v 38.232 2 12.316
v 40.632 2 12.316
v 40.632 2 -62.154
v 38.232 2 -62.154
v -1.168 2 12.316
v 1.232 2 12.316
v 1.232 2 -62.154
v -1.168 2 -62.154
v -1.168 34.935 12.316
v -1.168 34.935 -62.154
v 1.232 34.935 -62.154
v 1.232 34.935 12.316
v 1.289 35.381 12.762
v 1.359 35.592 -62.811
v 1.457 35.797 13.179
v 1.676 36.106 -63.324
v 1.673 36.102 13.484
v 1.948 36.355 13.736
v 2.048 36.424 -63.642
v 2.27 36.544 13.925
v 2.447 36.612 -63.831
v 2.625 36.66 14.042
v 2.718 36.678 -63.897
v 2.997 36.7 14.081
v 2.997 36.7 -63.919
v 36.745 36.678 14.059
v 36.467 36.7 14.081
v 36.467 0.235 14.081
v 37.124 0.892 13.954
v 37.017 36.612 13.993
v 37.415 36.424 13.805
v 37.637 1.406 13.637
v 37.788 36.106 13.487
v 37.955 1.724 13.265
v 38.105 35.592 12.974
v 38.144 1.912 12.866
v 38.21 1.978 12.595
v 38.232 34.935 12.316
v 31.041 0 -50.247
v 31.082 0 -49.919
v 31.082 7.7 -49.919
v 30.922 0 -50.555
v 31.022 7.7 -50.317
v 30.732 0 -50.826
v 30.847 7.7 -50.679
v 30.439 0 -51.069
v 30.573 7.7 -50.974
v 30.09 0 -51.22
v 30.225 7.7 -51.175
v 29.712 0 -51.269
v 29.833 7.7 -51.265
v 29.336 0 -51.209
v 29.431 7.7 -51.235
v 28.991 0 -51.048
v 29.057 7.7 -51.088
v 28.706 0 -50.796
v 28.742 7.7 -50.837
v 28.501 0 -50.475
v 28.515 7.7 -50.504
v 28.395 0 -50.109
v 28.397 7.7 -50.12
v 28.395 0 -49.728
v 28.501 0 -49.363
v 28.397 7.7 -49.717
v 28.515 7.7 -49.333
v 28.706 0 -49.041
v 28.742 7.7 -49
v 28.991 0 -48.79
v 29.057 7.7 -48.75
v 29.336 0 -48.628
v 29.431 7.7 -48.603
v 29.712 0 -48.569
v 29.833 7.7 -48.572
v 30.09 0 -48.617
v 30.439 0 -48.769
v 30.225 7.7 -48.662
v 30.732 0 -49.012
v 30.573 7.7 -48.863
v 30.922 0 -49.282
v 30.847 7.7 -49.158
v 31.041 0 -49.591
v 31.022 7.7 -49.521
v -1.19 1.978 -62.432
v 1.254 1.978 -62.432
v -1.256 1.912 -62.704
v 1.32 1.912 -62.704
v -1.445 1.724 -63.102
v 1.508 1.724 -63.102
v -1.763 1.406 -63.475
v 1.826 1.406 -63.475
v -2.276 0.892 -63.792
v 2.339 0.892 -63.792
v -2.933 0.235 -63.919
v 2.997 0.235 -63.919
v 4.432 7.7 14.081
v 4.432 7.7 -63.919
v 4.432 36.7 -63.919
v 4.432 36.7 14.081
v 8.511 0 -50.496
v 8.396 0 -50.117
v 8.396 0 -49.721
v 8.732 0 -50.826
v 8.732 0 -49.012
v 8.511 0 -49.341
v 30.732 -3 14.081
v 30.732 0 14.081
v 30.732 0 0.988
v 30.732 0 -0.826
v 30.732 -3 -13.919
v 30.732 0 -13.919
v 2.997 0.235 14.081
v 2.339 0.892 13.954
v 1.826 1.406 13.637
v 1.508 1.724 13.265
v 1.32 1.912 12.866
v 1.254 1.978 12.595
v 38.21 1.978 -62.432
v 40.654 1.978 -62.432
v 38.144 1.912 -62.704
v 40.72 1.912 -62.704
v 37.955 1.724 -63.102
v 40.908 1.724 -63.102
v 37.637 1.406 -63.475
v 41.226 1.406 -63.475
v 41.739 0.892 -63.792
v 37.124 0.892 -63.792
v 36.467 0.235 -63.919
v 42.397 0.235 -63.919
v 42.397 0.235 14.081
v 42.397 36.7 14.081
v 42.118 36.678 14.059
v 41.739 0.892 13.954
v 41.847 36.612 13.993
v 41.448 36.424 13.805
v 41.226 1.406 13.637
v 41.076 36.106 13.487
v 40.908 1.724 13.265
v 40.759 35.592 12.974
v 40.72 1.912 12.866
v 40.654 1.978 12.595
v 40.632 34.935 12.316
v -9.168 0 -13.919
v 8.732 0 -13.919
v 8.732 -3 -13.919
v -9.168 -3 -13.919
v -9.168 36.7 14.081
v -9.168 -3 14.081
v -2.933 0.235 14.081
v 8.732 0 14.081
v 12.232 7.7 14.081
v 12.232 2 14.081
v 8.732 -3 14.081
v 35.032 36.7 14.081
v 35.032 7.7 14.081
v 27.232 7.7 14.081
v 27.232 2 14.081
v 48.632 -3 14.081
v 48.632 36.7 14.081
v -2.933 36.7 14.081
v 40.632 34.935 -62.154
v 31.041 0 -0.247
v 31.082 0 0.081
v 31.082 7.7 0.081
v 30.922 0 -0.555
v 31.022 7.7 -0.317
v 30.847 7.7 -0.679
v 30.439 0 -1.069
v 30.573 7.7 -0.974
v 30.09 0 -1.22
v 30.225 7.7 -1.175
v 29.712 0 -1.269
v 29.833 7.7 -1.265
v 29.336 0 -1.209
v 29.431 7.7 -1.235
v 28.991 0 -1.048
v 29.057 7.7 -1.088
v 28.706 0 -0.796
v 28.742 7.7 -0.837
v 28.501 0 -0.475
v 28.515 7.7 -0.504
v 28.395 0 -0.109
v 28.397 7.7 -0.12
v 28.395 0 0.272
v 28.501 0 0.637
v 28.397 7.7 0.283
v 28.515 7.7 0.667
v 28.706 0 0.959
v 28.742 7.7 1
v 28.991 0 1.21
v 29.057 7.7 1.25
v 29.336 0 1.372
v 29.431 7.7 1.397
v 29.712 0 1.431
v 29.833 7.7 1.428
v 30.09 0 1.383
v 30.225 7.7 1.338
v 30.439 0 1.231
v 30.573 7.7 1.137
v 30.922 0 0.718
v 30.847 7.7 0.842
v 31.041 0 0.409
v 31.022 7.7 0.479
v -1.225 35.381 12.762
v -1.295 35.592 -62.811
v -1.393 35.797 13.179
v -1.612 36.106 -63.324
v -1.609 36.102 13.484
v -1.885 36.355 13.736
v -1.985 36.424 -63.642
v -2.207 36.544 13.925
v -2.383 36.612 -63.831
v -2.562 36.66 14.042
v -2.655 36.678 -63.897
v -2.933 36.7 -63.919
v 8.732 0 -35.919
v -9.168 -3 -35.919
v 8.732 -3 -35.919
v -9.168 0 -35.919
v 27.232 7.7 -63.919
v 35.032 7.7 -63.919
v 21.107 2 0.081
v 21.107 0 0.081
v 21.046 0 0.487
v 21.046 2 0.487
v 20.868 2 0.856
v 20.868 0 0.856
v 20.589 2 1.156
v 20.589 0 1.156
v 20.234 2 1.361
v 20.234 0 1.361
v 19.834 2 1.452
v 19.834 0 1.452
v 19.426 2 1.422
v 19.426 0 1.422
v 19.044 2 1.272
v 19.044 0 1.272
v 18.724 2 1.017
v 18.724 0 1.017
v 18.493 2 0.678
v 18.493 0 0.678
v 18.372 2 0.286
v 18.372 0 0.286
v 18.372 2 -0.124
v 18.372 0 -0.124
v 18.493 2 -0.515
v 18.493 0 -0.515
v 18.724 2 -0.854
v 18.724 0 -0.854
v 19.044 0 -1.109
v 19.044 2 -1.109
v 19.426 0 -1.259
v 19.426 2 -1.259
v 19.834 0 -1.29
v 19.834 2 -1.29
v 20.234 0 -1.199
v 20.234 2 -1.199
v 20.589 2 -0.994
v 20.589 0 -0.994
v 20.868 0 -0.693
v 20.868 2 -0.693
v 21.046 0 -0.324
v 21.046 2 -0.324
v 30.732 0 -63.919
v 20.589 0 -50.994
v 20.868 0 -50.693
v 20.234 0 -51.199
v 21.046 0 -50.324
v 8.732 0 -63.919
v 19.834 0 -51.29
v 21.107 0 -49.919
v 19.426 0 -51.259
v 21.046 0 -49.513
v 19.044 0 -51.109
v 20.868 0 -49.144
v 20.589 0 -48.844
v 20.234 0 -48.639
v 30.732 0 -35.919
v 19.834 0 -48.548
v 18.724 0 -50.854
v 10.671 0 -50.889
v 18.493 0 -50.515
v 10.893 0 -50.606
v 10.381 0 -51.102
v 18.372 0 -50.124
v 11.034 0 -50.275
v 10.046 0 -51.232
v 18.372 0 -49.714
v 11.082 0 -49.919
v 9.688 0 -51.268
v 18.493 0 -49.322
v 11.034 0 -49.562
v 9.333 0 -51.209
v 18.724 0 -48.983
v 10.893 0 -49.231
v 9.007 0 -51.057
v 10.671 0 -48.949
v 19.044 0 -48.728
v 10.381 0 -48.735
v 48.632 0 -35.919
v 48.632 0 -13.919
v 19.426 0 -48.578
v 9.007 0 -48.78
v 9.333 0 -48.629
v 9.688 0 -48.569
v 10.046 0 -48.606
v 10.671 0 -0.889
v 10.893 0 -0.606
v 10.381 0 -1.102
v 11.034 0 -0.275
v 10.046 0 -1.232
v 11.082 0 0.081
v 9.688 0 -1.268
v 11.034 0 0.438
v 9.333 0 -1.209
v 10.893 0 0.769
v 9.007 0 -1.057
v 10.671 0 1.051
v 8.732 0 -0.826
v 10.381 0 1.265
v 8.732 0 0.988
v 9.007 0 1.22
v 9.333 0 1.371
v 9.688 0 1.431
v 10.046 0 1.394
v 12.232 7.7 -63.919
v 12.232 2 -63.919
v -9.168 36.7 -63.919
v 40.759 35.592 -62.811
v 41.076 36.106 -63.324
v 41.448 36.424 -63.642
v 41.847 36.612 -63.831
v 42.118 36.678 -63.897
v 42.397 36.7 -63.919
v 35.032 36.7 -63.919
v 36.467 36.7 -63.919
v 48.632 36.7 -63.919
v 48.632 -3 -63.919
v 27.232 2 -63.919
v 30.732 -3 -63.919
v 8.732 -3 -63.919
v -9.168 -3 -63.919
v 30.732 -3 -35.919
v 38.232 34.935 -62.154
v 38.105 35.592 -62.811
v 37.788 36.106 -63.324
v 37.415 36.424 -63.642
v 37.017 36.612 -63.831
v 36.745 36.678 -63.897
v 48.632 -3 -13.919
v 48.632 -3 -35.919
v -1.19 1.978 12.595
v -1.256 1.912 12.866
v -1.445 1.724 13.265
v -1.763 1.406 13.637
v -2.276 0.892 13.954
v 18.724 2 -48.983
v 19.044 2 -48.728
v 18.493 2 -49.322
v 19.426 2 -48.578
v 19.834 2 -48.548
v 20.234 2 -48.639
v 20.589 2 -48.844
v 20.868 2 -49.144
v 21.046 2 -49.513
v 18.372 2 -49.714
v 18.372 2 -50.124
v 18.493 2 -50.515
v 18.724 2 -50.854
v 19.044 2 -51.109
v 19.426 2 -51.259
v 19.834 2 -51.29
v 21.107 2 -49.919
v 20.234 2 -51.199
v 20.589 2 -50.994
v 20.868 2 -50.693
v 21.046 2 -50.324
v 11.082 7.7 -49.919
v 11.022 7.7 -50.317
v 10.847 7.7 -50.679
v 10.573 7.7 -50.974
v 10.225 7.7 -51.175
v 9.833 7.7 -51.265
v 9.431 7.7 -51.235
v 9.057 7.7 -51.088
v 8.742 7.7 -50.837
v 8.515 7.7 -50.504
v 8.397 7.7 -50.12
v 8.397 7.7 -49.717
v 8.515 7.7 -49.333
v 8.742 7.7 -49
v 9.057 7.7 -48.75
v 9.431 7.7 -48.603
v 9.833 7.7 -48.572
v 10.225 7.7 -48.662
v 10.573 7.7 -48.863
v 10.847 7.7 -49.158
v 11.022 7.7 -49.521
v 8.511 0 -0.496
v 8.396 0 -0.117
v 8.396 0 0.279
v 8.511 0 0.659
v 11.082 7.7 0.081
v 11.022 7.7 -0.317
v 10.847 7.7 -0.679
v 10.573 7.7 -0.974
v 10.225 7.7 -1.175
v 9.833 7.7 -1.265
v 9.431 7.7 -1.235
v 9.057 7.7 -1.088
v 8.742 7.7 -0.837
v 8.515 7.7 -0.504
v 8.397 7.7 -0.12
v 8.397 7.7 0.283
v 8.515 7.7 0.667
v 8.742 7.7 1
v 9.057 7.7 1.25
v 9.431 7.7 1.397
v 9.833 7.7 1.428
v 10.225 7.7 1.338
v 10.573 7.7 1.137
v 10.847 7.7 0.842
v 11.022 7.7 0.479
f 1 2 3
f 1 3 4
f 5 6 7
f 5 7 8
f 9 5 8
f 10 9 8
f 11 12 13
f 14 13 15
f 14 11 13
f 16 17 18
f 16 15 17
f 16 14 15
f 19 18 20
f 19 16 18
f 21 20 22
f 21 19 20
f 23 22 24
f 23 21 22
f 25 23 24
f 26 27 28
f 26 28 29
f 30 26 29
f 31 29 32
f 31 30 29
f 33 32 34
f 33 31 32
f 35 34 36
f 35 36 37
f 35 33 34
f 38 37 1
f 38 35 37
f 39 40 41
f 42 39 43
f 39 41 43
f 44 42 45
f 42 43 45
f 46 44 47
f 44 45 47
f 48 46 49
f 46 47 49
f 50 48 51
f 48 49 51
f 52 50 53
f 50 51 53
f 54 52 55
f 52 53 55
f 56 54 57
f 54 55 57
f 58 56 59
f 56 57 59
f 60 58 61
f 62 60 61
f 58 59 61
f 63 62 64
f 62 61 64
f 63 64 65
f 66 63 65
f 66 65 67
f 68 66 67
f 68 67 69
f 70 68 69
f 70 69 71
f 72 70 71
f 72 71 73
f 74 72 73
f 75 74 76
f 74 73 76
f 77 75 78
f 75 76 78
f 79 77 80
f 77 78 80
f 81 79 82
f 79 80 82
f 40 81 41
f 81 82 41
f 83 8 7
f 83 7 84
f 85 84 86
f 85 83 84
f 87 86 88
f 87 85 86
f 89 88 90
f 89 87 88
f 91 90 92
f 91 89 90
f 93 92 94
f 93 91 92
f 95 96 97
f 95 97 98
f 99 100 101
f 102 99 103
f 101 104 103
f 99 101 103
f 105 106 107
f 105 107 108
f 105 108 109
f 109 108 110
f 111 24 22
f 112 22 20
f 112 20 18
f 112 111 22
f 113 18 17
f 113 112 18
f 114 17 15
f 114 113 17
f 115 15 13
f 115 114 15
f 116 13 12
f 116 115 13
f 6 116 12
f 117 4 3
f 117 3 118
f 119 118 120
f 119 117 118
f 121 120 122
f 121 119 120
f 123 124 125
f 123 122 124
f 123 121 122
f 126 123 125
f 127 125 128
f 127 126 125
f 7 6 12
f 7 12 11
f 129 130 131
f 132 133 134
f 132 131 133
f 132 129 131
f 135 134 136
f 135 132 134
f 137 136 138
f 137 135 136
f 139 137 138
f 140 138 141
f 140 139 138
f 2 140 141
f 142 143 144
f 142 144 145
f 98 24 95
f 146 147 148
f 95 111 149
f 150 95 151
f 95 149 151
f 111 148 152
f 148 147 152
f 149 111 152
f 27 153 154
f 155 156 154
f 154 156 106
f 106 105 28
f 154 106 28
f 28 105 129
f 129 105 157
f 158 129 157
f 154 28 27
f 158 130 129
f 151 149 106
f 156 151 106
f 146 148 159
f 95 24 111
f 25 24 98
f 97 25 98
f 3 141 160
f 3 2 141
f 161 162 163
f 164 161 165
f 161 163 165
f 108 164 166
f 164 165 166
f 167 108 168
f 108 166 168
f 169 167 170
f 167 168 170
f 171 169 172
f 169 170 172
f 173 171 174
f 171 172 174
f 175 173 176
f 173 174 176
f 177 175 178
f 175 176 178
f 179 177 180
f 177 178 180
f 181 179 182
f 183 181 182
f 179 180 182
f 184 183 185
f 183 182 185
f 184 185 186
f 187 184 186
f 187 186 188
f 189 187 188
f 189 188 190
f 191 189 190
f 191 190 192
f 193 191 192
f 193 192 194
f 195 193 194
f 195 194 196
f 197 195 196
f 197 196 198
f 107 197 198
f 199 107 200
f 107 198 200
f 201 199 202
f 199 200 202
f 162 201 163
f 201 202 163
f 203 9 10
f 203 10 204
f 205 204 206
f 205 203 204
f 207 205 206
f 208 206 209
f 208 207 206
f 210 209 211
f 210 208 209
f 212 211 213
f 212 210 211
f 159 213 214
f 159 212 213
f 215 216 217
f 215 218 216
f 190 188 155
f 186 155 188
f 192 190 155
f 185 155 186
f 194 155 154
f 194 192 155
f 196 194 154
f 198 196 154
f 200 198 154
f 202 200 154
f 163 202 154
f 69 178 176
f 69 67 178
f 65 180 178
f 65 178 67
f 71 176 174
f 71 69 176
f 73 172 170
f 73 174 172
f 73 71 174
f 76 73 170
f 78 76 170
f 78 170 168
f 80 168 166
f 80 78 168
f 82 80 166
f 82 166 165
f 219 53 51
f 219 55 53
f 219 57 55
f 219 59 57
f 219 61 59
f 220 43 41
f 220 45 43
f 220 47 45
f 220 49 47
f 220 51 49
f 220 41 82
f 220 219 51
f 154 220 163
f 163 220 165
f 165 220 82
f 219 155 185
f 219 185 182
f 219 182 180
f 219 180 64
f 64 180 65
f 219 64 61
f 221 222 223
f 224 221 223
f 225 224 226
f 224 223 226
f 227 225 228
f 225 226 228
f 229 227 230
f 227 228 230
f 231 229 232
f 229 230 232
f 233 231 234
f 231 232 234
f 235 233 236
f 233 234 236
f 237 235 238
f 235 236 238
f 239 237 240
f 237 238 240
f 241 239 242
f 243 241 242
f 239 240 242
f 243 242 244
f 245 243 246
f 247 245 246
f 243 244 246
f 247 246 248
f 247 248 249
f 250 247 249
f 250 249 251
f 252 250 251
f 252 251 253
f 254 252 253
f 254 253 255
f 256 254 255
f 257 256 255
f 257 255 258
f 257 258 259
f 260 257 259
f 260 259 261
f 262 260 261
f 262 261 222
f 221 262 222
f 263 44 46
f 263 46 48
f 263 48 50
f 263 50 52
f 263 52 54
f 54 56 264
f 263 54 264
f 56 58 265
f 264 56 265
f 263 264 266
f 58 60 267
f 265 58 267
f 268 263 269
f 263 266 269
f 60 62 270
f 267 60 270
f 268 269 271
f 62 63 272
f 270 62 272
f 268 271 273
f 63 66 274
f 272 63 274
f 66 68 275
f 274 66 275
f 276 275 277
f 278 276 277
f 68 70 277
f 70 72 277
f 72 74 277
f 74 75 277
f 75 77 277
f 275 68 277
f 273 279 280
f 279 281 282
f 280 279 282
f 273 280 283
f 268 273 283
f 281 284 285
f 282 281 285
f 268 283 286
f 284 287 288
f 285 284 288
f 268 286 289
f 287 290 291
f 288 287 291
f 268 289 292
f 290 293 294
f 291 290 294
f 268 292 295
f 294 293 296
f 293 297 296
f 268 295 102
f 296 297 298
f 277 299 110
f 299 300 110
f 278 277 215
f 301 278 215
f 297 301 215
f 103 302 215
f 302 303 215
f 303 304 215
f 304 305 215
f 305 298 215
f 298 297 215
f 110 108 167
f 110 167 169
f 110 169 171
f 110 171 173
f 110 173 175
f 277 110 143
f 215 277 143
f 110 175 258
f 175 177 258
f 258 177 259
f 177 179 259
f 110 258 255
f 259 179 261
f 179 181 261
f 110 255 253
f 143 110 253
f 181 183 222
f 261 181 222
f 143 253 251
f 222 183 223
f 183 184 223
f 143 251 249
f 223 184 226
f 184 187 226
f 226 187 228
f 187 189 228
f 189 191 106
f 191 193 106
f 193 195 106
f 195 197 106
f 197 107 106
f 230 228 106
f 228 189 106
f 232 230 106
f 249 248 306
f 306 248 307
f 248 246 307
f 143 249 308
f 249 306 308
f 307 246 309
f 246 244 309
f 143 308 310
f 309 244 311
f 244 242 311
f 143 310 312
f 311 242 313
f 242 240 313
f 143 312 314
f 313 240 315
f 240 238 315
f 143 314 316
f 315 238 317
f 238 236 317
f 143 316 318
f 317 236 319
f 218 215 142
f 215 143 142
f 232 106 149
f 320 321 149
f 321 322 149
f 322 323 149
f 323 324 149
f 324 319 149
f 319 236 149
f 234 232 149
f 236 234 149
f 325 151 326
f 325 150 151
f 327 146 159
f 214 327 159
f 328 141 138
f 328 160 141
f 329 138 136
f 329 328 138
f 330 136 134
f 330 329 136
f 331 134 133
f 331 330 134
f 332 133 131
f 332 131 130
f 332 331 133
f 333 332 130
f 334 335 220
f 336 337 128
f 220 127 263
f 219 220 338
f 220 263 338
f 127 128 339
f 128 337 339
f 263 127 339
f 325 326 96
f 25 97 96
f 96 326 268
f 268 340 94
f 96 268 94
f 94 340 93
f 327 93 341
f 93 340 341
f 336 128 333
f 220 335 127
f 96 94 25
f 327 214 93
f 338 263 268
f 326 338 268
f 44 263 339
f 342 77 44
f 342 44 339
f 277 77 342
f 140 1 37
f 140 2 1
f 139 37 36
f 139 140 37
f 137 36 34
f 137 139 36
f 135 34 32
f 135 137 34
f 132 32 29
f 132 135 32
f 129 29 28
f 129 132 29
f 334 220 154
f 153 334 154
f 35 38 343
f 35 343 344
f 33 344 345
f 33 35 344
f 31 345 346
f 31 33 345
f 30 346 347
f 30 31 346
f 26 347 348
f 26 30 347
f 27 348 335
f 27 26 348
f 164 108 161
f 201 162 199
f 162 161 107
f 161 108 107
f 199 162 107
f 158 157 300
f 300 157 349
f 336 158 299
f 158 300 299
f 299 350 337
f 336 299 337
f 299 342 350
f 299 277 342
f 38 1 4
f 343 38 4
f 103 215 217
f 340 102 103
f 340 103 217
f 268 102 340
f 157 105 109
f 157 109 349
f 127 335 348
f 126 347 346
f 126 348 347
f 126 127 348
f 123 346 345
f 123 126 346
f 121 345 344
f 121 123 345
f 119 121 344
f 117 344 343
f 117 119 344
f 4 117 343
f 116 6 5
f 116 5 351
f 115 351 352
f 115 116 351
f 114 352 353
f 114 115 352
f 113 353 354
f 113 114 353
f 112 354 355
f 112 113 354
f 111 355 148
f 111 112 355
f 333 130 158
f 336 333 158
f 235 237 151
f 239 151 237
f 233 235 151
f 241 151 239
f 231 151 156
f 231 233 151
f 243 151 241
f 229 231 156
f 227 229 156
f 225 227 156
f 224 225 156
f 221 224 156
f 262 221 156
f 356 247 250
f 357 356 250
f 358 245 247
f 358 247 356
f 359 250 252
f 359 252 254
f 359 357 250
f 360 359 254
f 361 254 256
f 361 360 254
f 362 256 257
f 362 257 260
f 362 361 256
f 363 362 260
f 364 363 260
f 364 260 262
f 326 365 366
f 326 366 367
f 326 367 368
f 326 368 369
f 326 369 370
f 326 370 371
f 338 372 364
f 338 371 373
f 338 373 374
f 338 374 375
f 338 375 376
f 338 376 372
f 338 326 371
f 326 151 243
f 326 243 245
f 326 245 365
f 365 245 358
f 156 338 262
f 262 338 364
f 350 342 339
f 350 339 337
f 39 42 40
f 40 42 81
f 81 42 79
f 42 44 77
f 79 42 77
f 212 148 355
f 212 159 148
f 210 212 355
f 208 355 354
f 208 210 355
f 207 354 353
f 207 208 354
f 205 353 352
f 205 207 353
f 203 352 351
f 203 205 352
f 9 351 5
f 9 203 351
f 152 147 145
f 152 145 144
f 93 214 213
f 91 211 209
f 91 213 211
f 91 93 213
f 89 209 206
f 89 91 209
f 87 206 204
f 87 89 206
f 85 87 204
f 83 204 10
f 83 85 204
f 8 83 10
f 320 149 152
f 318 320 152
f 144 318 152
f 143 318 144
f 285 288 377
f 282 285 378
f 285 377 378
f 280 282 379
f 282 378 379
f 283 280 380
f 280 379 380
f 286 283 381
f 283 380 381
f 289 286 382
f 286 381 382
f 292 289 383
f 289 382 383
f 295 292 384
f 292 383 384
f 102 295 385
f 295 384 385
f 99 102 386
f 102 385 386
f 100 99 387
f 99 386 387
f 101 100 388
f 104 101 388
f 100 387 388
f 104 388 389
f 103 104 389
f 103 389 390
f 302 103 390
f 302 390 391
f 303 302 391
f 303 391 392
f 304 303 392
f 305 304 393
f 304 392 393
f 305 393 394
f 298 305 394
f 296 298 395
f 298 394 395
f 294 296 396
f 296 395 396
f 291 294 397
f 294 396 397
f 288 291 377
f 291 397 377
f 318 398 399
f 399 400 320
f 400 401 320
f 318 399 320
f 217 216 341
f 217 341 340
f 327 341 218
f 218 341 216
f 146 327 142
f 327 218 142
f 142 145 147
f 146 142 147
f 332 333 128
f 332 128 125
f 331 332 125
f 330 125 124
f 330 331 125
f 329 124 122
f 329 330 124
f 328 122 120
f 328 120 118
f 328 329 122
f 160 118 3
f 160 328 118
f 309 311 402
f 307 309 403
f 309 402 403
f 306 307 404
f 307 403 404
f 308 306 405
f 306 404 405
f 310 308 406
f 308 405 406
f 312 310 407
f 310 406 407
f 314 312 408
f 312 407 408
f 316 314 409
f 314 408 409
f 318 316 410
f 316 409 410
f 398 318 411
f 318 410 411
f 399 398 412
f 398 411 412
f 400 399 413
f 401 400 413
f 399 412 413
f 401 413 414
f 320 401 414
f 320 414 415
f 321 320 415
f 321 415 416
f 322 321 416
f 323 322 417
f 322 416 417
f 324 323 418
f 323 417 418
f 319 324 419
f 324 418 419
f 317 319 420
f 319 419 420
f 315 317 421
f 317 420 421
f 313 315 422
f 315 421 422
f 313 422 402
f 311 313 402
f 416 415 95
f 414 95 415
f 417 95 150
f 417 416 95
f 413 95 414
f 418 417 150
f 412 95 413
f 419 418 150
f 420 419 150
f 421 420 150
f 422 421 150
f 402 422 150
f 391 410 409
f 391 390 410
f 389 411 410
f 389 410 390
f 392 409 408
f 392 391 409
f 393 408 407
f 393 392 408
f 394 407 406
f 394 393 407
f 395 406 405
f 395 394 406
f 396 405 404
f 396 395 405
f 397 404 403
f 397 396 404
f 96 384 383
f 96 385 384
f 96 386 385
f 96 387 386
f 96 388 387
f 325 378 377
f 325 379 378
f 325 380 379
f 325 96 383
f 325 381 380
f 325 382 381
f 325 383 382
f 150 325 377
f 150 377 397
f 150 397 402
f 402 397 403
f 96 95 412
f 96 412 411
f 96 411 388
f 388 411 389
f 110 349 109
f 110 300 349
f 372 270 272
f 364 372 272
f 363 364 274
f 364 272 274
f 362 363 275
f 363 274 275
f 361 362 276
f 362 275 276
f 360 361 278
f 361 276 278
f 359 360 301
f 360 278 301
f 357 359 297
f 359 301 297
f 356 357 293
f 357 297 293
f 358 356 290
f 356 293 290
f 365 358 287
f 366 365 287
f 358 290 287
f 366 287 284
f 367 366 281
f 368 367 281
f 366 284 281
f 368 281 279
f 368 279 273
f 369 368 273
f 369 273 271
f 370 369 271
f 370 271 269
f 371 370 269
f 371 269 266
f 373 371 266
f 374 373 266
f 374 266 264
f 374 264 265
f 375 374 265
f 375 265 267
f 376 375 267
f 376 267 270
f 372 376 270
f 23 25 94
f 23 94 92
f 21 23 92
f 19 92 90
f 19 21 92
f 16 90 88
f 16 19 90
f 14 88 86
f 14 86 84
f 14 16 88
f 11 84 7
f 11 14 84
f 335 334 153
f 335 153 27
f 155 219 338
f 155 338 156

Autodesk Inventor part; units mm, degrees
ref_plane "YZ Plane" through (0, 0, 0) normal (1, 0, 0) x (0, 1, 0)
ref_plane "XZ Plane" through (0, 0, 0) normal (0, 1, 0) x (-1, 0, 0)
ref_plane "XY Plane" through (0, 0, 0) normal (0, 0, 1) x (1, 0, 0)
sketch "Sketch1" plane through (0, 0, 0) normal (0, 1, 0) x (-1, 0, 0)
  line L0 (9.1683, 14.0813) -> (-48.6317, 14.0813)
  line L1 (-48.6317, 14.0813) -> (-48.6317, -63.9187)
  line L2 (-48.6317, -63.9187) -> (9.1683, -63.9187)
  line L3 (9.1683, -63.9187) -> (9.1683, 14.0813)
  point P0 (0, 0)
  dimension "d0" = 57.8
  dimension "d1" = 78
extrude "Extrusion1" add sketch "Sketch1" along normal blind 2
sketch "Sketch2" plane through (0, 2, 0) normal (0, 1, 0) x (1, 0, 0)
  line L0 (-9.1683, 63.9187) -> (-9.1683, -14.0813) projected
  line L1 (48.6317, 63.9187) -> (-9.1683, 63.9187) projected
  line L2 (-9.1683, -14.0813) -> (-1.1683, -14.0813)
  line L3 (-1.1683, -14.0813) -> (-1.1683, 63.9187)
  line L4 (-1.1683, 63.9187) -> (-9.1683, 63.9187)
  line L5 (-9.1683, 63.9187) -> (-9.1683, -14.0813)
  line L6 (48.6317, -14.0813) -> (48.6317, 63.9187) projected
  line L7 (48.6317, -14.0813) -> (40.6317, -14.0813)
  line L8 (40.6317, -14.0813) -> (40.6317, 63.9187)
  line L9 (40.6317, 63.9187) -> (48.6317, 63.9187)
  line L10 (48.6317, 63.9187) -> (48.6317, -14.0813)
  line L11 (1.2317, -14.0813) -> (1.2317, 63.9187)
  line L12 (-9.1683, -14.0813) -> (48.6317, -14.0813) projected
  line L13 (38.2317, -14.0813) -> (38.2317, 63.9187)
  line L14 (1.2317, -14.0813) -> (38.2317, -14.0813)
  line L15 (1.2317, 63.9187) -> (38.2317, 63.9187)
  point P0 (0, 0)
  dimension "d4" = 8
  dimension "d5" = 8
  dimension "d6" = 2.4
  dimension "d7" = 2.4
extrude "Extrusion2" add sketch "Sketch2" along normal blind 5.7 contours L1 L3 L2 L0 | L1 L13 L12 L11 | L1 L6 L7 L8
sketch "Sketch3" plane through (0, 7.7, 0) normal (0, 1, 0) x (1, 0, 0)
  circle A0 centre (9.7317, -0.0813) radius 1.35
  circle A1 centre (29.7317, -0.0813) radius 1.35
  line L0 (1.2317, 63.9187) -> (1.2317, -14.0813) projected
  circle A2 centre (9.7317, 49.9187) radius 1.35
  circle A3 centre (29.7317, 49.9187) radius 1.35
  line L1 (1.2317, -14.0813) -> (38.2317, -14.0813) projected
  point P0 (0, 0)
  dimension "d10" = 2.7
  dimension "d11" = 2.7
  dimension "d12" = 20
  dimension "d13" = 8.5
  dimension "d14" = 2.7
  dimension "d15" = 2.7
  dimension "d16" = 20
  dimension "d17" = 50
  dimension "d18" = 14
  dimension "d19" = 14
  dimension "d20" = 50
extrude "Extrusion3" cut sketch "Sketch3" against normal through all
sketch "Sketch4" plane through (0, 0, 0) normal (0, -1, 0) x (1, 0, 0)
  line L0 (8.7317, 14.0813) -> (8.7317, -13.9187)
  line L1 (8.7317, -13.9187) -> (-9.1683, -13.9187)
  line L2 (-9.1683, -35.9187) -> (8.7317, -35.9187)
  line L3 (8.7317, -35.9187) -> (8.7317, -63.9187)
  line L4 (8.7317, -63.9187) -> (30.7317, -63.9187)
  line L5 (30.7317, -63.9187) -> (30.7317, -35.9187)
  line L6 (30.7317, -35.9187) -> (48.6317, -35.9187)
  line L7 (48.6317, -13.9187) -> (30.7317, -13.9187)
  line L8 (30.7317, 14.0813) -> (30.7317, -13.9187)
  line L9 (30.7317, 14.0813) -> (8.7317, 14.0813)
  circle A0 centre (19.7317, 0.0813) radius 1.375
  circle A1 centre (19.7317, -49.9187) radius 1.375
  line L10 (48.6317, 14.0813) -> (48.6317, -63.9187) projected
  line L11 (-9.1683, 14.0813) -> (48.6317, 14.0813) projected
  line L12 (-9.1683, -13.9187) -> (-9.1683, -35.9187)
  line L13 (-9.1683, -63.9187) -> (-9.1683, 14.0813) projected
  line L14 (48.6317, -13.9187) -> (48.6317, -35.9187)
  line L15 (-9.1683, 14.0813) -> (48.6317, 14.0813)
  line L16 (48.6317, 14.0813) -> (48.6317, -63.9187)
  line L17 (48.6317, -63.9187) -> (-9.1683, -63.9187)
  line L18 (-9.1683, -63.9187) -> (-9.1683, 14.0813)
  point P0 (0, 0)
  point P1 (24.2887, -20.9845)
  point P2 (19.7317, -63.9187)
  dimension "d48" = 17.9
  dimension "d49" = 17.9
  dimension "d50" = 28
  dimension "d52" = 28
  dimension "d53" = 22
  dimension "d70" = 0
extrude "Extrusion4" add sketch "Sketch4" along normal blind 3 contours L0 L1 L13 L11 | L11 L10 L7 L8 | L2 L3 L17 L13 | L10 L17 L5 L6 | A0 | A1
sketch "Sketch5" plane through (24.7317, -3, 0.0813) normal (0, -1, 0) x (1, 0, 0)
  circle A0 centre (-5, 0) radius 1.375 projected
  circle A1 centre (-5, 0) radius 1.375
  circle A2 centre (-5, -50) radius 1.375 projected
  circle A3 centre (-5, -50) radius 1.375
  point P0 (-24.7317, -0.0813)
  dimension "d56" = 2.75
extrude "Extrusion5" cut sketch "Sketch5" against normal through all
sketch "Sketch6" plane through (0, 7.7, 0) normal (0, 1, 0) x (1, 0, 0)
  line L0 (12.2317, 63.9187) -> (27.2317, 63.9187)
  line L1 (27.2317, 63.9187) -> (27.2317, -14.0813)
  line L2 (27.2317, -14.0813) -> (12.2317, -14.0813)
  line L3 (12.2317, -14.0813) -> (12.2317, 63.9187)
  line L4 (38.2317, 63.9187) -> (1.2317, 63.9187) projected
  line L5 (1.2317, -14.0813) -> (38.2317, -14.0813) projected
  line L6 (48.6317, -14.0813) -> (48.6317, 63.9187) projected
  line L7 (-9.1683, 63.9187) -> (-9.1683, -14.0813) projected
  point P0 (0, 0)
  dimension "d59" = 0
  dimension "d60" = 0
  dimension "d61" = 21.4
  dimension "d62" = 21.4
extrude "Extrusion6" cut sketch "Sketch6" against normal blind 5.7
sketch "Sketch7" plane through (0, 7.7, 0) normal (0, 1, 0) x (1, 0, 0)
  line L0 (-9.1683, 63.9187) -> (-9.1683, -14.0813) projected
  line L1 (-1.1683, -14.0813) -> (1.2317, -14.0813) projected
  line L2 (-9.1683, 63.9187) -> (-1.1683, 63.9187)
  line L3 (-1.1683, 63.9187) -> (-1.1683, -14.0813)
  line L4 (-1.1683, -14.0813) -> (-9.1683, -14.0813)
  line L5 (-9.1683, -14.0813) -> (-9.1683, 63.9187)
  line L6 (48.6317, -14.0813) -> (48.6317, 63.9187) projected
  line L7 (40.6317, -14.0813) -> (40.6317, 63.9187) projected
  line L8 (48.6317, -14.0813) -> (40.6317, -14.0813)
  line L9 (40.6317, -14.0813) -> (40.6317, 63.9187)
  line L10 (40.6317, 63.9187) -> (48.6317, 63.9187)
  line L11 (48.6317, 63.9187) -> (48.6317, -14.0813)
  line L12 (1.2317, -14.0813) -> (1.2317, 63.9187) projected
  line L13 (1.2317, 63.9187) -> (4.4317, 63.9187)
  line L14 (4.4317, 63.9187) -> (4.4317, -14.0813)
  line L15 (4.4317, -14.0813) -> (1.2317, -14.0813)
  line L16 (1.2317, -14.0813) -> (1.2317, 63.9187)
  line L17 (38.2317, 63.9187) -> (38.2317, -14.0813) projected
  line L18 (38.2317, 63.9187) -> (35.0317, 63.9187)
  line L19 (35.0317, 63.9187) -> (35.0317, -14.0813)
  line L20 (35.0317, -14.0813) -> (38.2317, -14.0813)
  line L21 (38.2317, -14.0813) -> (38.2317, 63.9187)
  point P0 (0, 0)
  point P1 (38.2317, -14.0813)
  dimension "d71" = 3.2
  dimension "d72" = 3.2
extrude "Extrusion7" add sketch "Sketch7" along normal blind 29
fillet "Fillet6" radius 1.765 16 edges at (-1.1683, 19.35, 14.0813) (1.2317, 19.35, 14.0813) (1.2317, 36.7, -24.9187) (-1.1683, 36.7, -24.9187) (0.0317, 2, 14.0813) (38.2317, 36.7, -24.9187) (40.6317, 36.7, -24.9187) (38.2317, 19.35, 14.0813) (40.6317, 19.35, 14.0813) (39.4317, 2, 14.0813) (-1.1683, 19.35, -63.9187) (1.2317, 19.35, -63.9187) (38.2317, 19.35, -63.9187) (40.6317, 19.35, -63.9187) (39.4317, 2, -63.9187) (0.0317, 2, -63.9187)
properties part number "slider"
